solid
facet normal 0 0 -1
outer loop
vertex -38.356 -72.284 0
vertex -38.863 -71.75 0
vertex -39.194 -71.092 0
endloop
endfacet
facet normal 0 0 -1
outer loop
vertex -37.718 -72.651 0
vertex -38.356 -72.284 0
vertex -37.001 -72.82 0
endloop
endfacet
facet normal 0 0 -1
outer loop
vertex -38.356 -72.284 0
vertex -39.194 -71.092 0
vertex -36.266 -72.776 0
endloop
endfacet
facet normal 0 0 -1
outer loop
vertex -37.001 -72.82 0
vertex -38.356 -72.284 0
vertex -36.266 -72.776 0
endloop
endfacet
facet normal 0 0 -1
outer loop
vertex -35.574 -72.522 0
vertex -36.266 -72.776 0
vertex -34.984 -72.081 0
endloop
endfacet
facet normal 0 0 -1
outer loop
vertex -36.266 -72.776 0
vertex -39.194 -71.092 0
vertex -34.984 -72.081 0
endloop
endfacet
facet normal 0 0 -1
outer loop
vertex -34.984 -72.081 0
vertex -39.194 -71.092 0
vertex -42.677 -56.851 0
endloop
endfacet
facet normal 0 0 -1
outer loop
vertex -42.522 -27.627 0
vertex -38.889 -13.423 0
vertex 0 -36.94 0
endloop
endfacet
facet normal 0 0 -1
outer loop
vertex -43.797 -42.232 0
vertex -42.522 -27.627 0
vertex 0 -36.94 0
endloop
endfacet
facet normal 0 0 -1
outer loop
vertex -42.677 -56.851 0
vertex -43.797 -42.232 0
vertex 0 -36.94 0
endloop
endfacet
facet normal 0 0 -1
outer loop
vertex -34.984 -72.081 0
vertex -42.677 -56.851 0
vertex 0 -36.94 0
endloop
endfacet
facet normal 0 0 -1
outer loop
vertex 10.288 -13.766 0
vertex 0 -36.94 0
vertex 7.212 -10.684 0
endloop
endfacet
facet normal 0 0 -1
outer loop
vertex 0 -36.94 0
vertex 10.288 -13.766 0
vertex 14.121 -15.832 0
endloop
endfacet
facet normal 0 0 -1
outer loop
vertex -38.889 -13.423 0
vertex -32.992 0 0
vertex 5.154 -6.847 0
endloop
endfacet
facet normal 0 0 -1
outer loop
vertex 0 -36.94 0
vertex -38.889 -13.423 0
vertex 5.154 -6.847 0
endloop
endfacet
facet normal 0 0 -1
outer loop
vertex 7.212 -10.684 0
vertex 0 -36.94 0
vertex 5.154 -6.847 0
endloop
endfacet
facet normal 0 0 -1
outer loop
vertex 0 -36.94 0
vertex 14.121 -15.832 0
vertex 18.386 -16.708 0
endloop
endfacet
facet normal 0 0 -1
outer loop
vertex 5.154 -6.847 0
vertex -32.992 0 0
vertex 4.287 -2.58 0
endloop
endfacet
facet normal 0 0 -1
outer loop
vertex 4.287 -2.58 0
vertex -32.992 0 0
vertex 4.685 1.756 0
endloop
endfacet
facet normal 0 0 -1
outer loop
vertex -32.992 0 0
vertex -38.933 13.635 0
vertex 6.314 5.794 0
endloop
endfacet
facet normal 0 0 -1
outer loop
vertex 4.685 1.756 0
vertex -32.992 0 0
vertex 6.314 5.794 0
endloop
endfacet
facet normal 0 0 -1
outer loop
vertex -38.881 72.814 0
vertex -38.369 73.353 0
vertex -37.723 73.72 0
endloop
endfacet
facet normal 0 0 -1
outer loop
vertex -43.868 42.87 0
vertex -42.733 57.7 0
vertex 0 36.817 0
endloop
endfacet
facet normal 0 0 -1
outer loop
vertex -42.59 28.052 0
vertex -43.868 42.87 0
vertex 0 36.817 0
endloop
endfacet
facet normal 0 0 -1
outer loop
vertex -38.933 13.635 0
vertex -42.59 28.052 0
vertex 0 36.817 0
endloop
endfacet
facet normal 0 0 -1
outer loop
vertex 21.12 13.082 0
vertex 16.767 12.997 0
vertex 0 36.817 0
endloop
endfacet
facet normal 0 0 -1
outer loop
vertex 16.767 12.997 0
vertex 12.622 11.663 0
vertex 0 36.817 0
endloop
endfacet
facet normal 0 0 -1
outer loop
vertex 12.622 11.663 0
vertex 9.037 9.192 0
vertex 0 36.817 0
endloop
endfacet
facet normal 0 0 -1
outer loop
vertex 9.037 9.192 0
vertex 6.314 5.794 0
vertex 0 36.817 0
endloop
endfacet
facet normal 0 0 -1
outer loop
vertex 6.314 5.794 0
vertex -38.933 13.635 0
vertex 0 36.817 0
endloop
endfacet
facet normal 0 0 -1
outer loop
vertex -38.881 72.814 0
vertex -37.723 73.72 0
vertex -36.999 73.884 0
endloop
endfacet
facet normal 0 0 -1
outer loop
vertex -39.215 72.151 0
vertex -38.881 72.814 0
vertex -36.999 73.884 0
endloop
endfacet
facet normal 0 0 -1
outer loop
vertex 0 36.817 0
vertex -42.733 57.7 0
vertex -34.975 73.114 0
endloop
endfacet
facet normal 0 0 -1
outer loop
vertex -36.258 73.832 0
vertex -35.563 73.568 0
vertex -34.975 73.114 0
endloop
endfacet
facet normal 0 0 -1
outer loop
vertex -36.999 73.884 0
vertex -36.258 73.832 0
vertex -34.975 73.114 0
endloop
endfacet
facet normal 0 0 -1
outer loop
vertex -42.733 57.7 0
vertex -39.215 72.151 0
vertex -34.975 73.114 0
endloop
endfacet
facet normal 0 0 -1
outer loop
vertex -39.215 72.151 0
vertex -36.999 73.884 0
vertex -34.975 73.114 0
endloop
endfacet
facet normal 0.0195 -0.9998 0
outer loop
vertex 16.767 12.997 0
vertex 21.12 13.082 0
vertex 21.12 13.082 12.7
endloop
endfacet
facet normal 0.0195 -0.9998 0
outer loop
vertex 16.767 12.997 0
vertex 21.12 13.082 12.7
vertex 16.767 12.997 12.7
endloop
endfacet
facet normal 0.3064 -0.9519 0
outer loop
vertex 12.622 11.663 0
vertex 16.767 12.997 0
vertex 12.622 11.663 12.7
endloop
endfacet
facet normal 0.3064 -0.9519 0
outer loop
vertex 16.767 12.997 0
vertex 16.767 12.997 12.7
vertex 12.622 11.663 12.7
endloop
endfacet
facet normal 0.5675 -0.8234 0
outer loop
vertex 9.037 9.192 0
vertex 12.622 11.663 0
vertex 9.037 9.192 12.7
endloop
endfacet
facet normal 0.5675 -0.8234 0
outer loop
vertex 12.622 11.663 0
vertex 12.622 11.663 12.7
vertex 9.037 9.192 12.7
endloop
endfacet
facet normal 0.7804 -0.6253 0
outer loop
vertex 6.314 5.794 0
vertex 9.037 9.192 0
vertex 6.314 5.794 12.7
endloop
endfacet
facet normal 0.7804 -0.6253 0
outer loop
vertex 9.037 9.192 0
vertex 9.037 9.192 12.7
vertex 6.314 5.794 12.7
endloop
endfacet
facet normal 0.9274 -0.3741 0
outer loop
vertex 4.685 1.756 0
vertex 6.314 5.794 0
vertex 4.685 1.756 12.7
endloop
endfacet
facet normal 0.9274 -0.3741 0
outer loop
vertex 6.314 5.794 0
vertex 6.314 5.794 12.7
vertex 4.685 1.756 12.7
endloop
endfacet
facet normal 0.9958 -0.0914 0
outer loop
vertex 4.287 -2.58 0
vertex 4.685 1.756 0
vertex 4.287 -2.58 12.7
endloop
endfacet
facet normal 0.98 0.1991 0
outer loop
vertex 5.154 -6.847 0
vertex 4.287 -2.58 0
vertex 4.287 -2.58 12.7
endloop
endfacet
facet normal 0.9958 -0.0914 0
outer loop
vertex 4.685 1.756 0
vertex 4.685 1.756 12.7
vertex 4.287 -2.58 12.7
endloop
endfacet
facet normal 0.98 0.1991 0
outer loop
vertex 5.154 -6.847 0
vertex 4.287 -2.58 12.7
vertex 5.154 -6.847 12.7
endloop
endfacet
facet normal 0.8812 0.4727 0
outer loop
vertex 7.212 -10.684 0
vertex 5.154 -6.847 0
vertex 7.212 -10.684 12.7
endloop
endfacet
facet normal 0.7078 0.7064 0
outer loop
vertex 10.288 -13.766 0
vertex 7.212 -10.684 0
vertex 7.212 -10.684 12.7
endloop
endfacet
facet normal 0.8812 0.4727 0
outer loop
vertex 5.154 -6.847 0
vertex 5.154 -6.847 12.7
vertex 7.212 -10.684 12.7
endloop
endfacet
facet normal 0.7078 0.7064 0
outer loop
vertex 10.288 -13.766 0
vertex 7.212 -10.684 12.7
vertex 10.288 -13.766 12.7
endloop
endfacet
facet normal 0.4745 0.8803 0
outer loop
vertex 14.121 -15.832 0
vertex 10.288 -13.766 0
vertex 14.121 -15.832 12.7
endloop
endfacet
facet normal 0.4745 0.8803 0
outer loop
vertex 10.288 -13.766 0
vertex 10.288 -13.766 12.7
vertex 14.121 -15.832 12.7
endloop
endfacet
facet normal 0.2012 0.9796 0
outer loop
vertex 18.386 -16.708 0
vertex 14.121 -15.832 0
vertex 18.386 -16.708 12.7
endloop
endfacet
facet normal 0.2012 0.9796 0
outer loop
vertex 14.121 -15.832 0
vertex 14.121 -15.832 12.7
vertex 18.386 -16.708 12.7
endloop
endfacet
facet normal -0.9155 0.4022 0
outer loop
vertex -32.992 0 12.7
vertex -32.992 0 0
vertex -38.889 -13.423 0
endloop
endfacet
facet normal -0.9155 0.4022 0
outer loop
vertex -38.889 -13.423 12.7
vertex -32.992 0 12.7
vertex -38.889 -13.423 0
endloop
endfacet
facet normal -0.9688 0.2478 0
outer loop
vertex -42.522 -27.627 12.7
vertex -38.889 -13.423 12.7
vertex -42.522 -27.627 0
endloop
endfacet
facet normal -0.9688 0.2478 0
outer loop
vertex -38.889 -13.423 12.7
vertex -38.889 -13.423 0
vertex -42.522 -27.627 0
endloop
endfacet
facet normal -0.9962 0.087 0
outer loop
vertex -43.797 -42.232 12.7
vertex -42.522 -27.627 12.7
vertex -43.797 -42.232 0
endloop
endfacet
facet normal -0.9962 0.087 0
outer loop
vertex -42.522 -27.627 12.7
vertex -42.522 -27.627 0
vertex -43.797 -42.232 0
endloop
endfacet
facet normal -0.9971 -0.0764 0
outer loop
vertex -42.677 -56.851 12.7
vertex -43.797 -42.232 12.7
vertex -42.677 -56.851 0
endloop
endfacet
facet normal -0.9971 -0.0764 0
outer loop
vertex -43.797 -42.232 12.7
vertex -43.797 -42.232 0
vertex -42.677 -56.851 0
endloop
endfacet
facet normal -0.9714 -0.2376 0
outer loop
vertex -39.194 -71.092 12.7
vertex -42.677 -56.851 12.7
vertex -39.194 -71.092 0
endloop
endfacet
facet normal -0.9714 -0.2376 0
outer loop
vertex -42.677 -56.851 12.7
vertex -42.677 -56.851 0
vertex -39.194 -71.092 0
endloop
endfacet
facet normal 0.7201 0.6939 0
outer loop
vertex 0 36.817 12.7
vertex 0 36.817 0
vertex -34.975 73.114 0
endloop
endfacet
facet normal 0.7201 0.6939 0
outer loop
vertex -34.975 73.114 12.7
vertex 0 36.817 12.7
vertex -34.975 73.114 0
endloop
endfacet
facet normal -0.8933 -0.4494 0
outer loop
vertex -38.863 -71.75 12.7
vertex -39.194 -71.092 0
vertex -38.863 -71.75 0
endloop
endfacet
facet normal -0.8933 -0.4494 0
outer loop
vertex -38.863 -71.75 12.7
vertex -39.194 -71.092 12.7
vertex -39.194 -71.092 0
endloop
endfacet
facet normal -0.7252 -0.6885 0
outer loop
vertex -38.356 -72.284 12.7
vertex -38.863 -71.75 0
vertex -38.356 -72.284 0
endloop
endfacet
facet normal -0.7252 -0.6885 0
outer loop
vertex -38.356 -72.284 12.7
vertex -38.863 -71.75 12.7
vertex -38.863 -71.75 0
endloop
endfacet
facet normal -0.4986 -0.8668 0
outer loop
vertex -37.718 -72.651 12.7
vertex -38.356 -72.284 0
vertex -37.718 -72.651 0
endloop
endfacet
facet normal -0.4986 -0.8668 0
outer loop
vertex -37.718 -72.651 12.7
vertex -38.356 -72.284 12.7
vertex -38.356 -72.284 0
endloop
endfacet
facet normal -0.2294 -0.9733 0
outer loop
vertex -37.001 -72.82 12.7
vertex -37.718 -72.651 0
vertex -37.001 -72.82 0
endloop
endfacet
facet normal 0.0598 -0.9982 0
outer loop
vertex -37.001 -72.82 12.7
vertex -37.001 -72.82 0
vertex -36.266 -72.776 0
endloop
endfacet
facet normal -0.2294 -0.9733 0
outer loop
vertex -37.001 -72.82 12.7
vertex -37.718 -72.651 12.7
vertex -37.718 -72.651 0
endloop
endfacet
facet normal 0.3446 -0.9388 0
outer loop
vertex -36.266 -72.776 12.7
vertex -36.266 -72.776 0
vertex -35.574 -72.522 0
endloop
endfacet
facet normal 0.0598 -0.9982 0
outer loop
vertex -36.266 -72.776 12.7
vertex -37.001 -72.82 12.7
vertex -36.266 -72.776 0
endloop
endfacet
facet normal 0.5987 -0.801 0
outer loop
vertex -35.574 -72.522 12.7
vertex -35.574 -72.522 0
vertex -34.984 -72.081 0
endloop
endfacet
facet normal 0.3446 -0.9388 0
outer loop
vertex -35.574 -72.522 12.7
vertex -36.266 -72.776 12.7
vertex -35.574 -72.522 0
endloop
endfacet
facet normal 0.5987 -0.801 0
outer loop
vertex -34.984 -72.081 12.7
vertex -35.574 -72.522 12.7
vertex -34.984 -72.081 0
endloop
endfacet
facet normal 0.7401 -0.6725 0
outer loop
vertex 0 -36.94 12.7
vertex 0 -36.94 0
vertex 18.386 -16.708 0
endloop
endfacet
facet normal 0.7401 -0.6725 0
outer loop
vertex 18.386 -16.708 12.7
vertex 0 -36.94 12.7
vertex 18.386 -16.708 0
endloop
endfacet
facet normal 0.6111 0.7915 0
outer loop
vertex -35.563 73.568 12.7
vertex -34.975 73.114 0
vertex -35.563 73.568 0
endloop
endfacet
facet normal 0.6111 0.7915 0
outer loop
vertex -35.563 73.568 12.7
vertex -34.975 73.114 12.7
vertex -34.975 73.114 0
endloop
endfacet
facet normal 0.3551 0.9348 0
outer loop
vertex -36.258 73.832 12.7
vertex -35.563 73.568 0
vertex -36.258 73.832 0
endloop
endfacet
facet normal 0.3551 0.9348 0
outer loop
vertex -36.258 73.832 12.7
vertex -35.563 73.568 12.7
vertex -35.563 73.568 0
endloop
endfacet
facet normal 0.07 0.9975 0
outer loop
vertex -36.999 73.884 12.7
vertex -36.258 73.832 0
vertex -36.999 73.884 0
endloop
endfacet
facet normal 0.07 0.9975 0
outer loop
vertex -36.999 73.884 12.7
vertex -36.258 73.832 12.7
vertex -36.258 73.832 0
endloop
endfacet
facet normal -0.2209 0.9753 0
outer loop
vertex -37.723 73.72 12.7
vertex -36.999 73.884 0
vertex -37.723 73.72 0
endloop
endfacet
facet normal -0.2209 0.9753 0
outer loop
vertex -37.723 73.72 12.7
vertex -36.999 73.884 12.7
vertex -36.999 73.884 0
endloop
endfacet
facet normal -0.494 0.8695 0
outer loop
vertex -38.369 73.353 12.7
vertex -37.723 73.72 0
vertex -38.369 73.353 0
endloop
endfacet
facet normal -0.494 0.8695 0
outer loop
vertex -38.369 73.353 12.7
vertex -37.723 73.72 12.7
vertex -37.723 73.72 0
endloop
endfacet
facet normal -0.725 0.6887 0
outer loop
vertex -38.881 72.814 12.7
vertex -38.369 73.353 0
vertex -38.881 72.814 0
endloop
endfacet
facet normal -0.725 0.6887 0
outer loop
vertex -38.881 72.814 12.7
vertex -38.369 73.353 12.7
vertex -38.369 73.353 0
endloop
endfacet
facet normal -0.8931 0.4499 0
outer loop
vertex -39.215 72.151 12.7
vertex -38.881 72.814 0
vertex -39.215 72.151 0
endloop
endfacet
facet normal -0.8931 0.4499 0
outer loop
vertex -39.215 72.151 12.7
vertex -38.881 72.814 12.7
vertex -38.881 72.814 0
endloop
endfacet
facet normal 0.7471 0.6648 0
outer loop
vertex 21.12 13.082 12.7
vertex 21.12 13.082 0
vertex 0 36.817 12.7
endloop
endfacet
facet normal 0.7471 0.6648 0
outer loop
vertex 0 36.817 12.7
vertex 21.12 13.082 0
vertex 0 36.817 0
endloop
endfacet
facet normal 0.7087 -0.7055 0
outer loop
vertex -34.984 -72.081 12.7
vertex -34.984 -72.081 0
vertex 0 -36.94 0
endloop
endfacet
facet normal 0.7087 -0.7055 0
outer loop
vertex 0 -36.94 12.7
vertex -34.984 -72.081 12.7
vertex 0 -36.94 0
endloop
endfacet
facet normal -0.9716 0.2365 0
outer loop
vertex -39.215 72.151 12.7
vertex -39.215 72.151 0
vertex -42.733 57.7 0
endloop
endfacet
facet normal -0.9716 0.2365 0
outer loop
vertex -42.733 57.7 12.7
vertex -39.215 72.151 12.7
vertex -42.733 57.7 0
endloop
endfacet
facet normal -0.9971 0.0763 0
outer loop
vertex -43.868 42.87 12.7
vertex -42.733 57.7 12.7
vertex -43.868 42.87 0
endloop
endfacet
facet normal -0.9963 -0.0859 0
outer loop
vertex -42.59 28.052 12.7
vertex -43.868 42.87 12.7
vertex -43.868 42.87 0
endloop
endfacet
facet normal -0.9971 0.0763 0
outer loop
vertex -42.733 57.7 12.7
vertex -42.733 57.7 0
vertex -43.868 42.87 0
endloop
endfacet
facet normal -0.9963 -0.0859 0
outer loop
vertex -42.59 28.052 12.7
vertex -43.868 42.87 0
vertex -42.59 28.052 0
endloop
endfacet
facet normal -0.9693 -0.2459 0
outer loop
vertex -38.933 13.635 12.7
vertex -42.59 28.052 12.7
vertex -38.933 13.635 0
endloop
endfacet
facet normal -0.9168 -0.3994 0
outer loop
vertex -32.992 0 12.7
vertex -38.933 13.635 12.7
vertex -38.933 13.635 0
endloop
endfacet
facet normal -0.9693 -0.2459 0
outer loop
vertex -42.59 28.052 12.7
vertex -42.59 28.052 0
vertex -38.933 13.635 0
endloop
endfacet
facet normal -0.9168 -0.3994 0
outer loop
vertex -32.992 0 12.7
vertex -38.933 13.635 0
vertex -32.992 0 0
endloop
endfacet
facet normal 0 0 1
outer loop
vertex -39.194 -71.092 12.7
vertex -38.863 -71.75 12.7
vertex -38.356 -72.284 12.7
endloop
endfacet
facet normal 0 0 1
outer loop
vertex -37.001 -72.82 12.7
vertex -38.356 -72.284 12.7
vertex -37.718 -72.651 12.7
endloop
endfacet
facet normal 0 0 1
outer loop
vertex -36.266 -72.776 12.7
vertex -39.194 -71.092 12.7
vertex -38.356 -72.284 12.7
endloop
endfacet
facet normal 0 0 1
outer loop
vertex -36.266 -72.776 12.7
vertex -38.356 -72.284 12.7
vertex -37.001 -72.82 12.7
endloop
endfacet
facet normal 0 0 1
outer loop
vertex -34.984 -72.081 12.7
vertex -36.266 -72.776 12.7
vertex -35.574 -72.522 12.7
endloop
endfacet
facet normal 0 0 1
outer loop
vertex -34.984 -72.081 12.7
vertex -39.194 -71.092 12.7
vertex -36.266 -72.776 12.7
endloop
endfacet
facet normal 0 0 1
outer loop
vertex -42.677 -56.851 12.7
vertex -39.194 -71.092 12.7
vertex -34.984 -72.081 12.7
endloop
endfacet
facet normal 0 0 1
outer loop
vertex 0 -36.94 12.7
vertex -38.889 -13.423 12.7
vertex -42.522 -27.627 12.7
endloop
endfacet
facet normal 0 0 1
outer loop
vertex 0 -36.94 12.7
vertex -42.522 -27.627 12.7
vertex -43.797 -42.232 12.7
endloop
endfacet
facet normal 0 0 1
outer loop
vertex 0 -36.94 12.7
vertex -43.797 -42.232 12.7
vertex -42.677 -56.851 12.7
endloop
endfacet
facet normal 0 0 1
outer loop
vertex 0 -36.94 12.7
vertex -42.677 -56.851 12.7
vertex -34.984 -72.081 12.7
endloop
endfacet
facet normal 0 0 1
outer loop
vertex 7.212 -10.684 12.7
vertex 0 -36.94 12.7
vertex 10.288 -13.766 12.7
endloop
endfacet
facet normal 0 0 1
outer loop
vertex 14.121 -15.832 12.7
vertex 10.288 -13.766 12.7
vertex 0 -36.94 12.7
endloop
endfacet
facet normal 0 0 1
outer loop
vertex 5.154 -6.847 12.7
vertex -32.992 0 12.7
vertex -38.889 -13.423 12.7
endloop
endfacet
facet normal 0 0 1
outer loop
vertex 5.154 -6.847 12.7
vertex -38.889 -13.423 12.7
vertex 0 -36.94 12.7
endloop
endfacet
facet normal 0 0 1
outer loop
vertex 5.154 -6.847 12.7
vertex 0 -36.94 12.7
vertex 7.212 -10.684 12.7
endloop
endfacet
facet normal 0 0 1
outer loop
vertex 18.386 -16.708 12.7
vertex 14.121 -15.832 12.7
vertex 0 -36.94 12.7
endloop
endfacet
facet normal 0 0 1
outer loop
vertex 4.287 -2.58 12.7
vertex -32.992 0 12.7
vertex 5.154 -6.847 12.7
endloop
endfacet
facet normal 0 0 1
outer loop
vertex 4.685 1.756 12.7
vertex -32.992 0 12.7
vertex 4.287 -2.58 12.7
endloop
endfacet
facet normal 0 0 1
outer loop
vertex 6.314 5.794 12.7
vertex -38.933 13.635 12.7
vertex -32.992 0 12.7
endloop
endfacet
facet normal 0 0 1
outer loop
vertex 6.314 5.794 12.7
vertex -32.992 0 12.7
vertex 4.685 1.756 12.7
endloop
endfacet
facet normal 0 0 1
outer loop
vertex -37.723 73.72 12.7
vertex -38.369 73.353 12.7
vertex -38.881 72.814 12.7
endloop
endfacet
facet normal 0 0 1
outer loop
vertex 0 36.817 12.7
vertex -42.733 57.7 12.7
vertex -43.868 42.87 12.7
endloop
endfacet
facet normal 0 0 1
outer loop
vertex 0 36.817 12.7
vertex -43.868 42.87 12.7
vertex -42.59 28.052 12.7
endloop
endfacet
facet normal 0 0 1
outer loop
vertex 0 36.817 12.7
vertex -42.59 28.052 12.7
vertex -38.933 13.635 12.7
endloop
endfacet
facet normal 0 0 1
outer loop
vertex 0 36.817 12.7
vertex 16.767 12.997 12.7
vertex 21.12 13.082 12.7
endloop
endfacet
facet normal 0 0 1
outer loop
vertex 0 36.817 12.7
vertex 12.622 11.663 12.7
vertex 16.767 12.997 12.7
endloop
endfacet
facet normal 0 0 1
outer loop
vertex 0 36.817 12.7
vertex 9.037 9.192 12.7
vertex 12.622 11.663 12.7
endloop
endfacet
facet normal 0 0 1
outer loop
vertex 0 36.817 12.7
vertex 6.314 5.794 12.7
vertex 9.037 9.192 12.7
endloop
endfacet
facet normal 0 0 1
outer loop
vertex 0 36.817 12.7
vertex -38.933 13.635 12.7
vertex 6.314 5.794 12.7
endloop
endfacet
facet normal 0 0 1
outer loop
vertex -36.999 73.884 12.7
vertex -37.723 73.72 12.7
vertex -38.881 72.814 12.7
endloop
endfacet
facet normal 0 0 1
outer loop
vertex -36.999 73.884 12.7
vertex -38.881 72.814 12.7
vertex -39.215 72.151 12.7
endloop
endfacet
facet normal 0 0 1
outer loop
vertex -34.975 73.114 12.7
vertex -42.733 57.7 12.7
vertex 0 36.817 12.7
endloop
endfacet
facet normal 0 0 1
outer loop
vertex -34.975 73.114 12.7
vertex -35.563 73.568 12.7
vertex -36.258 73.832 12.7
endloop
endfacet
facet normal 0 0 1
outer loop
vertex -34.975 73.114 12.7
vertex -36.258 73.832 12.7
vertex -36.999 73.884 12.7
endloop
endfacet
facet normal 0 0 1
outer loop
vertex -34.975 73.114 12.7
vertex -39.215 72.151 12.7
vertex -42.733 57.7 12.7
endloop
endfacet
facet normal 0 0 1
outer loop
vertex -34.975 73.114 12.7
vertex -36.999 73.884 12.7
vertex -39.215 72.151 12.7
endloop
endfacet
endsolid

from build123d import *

# Parameters (mm, degrees)
F1_DEPTH = 12.7
F2_R     = 2.54
F4_DEPTH = 25.4


with BuildPart() as f1:
    # F0 (on Top) → F1 (new body)
    with BuildSketch(Plane.XY):
        with BuildLine():
            ThreePointArc((18.385943, -16.708252), (24.739692, -2.270726), (21.12025, 13.082187))
            Line((21.12025, 13.082187), (0, 36.817349))
            Line((0, 36.817349), (-37.818789, 76.065511))
            ThreePointArc((-37.818789, 76.065511), (-43.685006, 37.507391), (-32.992173, 0))
            ThreePointArc((-32.992173, 0), (-43.612045, -36.935455), (-37.818789, -74.928187))
            Line((-37.818789, -74.928187), (0, -36.940344))
            Line((0, -36.940344), (18.385943, -16.708252))
        make_face()
    extrude(amount=F1_DEPTH)

    # F2
    f2_edges = [f1.edges().sort_by_distance(p)[0] for p in [
        (-37.818789, -74.928187, 6.35),
        (-37.818789, 76.065511, 6.35),
    ]]
    fillet(f2_edges, radius=F2_R)

    # F3 (on face) → F4 (cut)
    with BuildSketch(Plane.XY.offset(12.7)):
        with BuildLine():
            ThreePointArc((18.385943, -16.708252), (24.739692, -2.270726), (21.12025, 13.082187))
            ThreePointArc((21.12025, 13.082187), (4.327566, -0.397205), (18.385943, -16.708252))
        make_face()
    extrude(amount=-F4_DEPTH, mode=Mode.SUBTRACT)


solid = f1.part
